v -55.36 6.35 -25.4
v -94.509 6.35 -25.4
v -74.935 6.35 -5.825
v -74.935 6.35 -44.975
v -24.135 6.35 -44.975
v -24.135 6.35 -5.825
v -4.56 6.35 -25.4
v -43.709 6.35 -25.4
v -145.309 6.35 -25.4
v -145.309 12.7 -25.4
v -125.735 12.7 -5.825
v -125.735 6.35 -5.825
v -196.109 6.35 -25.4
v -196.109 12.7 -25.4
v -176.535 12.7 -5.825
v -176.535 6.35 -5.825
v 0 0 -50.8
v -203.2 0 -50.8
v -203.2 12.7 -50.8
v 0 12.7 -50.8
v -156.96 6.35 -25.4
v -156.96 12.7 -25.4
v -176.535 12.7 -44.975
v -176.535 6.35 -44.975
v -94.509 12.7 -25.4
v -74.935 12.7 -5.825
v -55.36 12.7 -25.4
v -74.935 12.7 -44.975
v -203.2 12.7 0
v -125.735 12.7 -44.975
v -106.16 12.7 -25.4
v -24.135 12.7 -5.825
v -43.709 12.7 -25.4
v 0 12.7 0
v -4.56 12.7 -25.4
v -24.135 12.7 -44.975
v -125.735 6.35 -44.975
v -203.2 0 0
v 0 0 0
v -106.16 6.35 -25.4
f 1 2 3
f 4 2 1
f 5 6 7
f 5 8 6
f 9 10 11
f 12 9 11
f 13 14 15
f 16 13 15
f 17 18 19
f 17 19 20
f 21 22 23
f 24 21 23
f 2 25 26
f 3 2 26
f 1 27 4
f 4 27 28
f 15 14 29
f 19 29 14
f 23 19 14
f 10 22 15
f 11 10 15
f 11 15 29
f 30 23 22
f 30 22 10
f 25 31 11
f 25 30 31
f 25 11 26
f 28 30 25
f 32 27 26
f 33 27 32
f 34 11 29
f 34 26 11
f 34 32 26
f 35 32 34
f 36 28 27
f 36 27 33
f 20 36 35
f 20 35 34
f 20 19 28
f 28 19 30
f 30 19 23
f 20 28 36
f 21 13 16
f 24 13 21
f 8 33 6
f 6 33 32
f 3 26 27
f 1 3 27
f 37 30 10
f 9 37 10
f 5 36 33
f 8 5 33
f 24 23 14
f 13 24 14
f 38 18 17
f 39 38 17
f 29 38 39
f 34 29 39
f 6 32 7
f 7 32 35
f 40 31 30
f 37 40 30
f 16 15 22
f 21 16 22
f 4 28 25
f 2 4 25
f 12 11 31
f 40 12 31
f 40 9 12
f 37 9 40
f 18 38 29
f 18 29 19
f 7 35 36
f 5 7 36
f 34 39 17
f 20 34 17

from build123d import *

# Parameters (mm, degrees)
SKETCH1_W           = 203.2
SKETCH1_H           = 50.8
BOSS_EXTRUDE1_DEPTH = 12.7
CUT_EXTRUDE6_DEPTH  = 6.35


with BuildPart() as part:
    # Sketch1 → Boss-Extrude1 (new body)
    with BuildSketch(Plane(origin=(0, 0, 0), x_dir=(1, 0, 0), z_dir=(0, 1, 0))):
        with Locations((-101.6, 25.4)):
            Rectangle(SKETCH1_W, SKETCH1_H)
    extrude(amount=BOSS_EXTRUDE1_DEPTH)

    # Sketch2 → Cut-Extrude6 (cut)
    with BuildSketch(Plane(origin=(0, 12.7, 0), x_dir=(1, 0, 0), z_dir=(0, 1, 0))):
        Polygon((-176.534655494, 5.825201554), (-156.959857048, 25.4), (-176.534655494, 44.974798446), (-196.10945394, 25.4), align=None)
        Polygon((-125.734655494, 5.825201554), (-106.159857048, 25.4), (-125.734655494, 44.974798446), (-145.30945394, 25.4), align=None)
        Polygon((-74.934655494, 5.825201554), (-55.359857048, 25.4), (-74.934655494, 44.974798446), (-94.50945394, 25.4), align=None)
        Polygon((-24.134655494, 5.825201554), (-4.559857048, 25.4), (-24.134655494, 44.974798446), (-43.70945394, 25.4), align=None)
    extrude(amount=-CUT_EXTRUDE6_DEPTH, mode=Mode.SUBTRACT)


solid = part.part
